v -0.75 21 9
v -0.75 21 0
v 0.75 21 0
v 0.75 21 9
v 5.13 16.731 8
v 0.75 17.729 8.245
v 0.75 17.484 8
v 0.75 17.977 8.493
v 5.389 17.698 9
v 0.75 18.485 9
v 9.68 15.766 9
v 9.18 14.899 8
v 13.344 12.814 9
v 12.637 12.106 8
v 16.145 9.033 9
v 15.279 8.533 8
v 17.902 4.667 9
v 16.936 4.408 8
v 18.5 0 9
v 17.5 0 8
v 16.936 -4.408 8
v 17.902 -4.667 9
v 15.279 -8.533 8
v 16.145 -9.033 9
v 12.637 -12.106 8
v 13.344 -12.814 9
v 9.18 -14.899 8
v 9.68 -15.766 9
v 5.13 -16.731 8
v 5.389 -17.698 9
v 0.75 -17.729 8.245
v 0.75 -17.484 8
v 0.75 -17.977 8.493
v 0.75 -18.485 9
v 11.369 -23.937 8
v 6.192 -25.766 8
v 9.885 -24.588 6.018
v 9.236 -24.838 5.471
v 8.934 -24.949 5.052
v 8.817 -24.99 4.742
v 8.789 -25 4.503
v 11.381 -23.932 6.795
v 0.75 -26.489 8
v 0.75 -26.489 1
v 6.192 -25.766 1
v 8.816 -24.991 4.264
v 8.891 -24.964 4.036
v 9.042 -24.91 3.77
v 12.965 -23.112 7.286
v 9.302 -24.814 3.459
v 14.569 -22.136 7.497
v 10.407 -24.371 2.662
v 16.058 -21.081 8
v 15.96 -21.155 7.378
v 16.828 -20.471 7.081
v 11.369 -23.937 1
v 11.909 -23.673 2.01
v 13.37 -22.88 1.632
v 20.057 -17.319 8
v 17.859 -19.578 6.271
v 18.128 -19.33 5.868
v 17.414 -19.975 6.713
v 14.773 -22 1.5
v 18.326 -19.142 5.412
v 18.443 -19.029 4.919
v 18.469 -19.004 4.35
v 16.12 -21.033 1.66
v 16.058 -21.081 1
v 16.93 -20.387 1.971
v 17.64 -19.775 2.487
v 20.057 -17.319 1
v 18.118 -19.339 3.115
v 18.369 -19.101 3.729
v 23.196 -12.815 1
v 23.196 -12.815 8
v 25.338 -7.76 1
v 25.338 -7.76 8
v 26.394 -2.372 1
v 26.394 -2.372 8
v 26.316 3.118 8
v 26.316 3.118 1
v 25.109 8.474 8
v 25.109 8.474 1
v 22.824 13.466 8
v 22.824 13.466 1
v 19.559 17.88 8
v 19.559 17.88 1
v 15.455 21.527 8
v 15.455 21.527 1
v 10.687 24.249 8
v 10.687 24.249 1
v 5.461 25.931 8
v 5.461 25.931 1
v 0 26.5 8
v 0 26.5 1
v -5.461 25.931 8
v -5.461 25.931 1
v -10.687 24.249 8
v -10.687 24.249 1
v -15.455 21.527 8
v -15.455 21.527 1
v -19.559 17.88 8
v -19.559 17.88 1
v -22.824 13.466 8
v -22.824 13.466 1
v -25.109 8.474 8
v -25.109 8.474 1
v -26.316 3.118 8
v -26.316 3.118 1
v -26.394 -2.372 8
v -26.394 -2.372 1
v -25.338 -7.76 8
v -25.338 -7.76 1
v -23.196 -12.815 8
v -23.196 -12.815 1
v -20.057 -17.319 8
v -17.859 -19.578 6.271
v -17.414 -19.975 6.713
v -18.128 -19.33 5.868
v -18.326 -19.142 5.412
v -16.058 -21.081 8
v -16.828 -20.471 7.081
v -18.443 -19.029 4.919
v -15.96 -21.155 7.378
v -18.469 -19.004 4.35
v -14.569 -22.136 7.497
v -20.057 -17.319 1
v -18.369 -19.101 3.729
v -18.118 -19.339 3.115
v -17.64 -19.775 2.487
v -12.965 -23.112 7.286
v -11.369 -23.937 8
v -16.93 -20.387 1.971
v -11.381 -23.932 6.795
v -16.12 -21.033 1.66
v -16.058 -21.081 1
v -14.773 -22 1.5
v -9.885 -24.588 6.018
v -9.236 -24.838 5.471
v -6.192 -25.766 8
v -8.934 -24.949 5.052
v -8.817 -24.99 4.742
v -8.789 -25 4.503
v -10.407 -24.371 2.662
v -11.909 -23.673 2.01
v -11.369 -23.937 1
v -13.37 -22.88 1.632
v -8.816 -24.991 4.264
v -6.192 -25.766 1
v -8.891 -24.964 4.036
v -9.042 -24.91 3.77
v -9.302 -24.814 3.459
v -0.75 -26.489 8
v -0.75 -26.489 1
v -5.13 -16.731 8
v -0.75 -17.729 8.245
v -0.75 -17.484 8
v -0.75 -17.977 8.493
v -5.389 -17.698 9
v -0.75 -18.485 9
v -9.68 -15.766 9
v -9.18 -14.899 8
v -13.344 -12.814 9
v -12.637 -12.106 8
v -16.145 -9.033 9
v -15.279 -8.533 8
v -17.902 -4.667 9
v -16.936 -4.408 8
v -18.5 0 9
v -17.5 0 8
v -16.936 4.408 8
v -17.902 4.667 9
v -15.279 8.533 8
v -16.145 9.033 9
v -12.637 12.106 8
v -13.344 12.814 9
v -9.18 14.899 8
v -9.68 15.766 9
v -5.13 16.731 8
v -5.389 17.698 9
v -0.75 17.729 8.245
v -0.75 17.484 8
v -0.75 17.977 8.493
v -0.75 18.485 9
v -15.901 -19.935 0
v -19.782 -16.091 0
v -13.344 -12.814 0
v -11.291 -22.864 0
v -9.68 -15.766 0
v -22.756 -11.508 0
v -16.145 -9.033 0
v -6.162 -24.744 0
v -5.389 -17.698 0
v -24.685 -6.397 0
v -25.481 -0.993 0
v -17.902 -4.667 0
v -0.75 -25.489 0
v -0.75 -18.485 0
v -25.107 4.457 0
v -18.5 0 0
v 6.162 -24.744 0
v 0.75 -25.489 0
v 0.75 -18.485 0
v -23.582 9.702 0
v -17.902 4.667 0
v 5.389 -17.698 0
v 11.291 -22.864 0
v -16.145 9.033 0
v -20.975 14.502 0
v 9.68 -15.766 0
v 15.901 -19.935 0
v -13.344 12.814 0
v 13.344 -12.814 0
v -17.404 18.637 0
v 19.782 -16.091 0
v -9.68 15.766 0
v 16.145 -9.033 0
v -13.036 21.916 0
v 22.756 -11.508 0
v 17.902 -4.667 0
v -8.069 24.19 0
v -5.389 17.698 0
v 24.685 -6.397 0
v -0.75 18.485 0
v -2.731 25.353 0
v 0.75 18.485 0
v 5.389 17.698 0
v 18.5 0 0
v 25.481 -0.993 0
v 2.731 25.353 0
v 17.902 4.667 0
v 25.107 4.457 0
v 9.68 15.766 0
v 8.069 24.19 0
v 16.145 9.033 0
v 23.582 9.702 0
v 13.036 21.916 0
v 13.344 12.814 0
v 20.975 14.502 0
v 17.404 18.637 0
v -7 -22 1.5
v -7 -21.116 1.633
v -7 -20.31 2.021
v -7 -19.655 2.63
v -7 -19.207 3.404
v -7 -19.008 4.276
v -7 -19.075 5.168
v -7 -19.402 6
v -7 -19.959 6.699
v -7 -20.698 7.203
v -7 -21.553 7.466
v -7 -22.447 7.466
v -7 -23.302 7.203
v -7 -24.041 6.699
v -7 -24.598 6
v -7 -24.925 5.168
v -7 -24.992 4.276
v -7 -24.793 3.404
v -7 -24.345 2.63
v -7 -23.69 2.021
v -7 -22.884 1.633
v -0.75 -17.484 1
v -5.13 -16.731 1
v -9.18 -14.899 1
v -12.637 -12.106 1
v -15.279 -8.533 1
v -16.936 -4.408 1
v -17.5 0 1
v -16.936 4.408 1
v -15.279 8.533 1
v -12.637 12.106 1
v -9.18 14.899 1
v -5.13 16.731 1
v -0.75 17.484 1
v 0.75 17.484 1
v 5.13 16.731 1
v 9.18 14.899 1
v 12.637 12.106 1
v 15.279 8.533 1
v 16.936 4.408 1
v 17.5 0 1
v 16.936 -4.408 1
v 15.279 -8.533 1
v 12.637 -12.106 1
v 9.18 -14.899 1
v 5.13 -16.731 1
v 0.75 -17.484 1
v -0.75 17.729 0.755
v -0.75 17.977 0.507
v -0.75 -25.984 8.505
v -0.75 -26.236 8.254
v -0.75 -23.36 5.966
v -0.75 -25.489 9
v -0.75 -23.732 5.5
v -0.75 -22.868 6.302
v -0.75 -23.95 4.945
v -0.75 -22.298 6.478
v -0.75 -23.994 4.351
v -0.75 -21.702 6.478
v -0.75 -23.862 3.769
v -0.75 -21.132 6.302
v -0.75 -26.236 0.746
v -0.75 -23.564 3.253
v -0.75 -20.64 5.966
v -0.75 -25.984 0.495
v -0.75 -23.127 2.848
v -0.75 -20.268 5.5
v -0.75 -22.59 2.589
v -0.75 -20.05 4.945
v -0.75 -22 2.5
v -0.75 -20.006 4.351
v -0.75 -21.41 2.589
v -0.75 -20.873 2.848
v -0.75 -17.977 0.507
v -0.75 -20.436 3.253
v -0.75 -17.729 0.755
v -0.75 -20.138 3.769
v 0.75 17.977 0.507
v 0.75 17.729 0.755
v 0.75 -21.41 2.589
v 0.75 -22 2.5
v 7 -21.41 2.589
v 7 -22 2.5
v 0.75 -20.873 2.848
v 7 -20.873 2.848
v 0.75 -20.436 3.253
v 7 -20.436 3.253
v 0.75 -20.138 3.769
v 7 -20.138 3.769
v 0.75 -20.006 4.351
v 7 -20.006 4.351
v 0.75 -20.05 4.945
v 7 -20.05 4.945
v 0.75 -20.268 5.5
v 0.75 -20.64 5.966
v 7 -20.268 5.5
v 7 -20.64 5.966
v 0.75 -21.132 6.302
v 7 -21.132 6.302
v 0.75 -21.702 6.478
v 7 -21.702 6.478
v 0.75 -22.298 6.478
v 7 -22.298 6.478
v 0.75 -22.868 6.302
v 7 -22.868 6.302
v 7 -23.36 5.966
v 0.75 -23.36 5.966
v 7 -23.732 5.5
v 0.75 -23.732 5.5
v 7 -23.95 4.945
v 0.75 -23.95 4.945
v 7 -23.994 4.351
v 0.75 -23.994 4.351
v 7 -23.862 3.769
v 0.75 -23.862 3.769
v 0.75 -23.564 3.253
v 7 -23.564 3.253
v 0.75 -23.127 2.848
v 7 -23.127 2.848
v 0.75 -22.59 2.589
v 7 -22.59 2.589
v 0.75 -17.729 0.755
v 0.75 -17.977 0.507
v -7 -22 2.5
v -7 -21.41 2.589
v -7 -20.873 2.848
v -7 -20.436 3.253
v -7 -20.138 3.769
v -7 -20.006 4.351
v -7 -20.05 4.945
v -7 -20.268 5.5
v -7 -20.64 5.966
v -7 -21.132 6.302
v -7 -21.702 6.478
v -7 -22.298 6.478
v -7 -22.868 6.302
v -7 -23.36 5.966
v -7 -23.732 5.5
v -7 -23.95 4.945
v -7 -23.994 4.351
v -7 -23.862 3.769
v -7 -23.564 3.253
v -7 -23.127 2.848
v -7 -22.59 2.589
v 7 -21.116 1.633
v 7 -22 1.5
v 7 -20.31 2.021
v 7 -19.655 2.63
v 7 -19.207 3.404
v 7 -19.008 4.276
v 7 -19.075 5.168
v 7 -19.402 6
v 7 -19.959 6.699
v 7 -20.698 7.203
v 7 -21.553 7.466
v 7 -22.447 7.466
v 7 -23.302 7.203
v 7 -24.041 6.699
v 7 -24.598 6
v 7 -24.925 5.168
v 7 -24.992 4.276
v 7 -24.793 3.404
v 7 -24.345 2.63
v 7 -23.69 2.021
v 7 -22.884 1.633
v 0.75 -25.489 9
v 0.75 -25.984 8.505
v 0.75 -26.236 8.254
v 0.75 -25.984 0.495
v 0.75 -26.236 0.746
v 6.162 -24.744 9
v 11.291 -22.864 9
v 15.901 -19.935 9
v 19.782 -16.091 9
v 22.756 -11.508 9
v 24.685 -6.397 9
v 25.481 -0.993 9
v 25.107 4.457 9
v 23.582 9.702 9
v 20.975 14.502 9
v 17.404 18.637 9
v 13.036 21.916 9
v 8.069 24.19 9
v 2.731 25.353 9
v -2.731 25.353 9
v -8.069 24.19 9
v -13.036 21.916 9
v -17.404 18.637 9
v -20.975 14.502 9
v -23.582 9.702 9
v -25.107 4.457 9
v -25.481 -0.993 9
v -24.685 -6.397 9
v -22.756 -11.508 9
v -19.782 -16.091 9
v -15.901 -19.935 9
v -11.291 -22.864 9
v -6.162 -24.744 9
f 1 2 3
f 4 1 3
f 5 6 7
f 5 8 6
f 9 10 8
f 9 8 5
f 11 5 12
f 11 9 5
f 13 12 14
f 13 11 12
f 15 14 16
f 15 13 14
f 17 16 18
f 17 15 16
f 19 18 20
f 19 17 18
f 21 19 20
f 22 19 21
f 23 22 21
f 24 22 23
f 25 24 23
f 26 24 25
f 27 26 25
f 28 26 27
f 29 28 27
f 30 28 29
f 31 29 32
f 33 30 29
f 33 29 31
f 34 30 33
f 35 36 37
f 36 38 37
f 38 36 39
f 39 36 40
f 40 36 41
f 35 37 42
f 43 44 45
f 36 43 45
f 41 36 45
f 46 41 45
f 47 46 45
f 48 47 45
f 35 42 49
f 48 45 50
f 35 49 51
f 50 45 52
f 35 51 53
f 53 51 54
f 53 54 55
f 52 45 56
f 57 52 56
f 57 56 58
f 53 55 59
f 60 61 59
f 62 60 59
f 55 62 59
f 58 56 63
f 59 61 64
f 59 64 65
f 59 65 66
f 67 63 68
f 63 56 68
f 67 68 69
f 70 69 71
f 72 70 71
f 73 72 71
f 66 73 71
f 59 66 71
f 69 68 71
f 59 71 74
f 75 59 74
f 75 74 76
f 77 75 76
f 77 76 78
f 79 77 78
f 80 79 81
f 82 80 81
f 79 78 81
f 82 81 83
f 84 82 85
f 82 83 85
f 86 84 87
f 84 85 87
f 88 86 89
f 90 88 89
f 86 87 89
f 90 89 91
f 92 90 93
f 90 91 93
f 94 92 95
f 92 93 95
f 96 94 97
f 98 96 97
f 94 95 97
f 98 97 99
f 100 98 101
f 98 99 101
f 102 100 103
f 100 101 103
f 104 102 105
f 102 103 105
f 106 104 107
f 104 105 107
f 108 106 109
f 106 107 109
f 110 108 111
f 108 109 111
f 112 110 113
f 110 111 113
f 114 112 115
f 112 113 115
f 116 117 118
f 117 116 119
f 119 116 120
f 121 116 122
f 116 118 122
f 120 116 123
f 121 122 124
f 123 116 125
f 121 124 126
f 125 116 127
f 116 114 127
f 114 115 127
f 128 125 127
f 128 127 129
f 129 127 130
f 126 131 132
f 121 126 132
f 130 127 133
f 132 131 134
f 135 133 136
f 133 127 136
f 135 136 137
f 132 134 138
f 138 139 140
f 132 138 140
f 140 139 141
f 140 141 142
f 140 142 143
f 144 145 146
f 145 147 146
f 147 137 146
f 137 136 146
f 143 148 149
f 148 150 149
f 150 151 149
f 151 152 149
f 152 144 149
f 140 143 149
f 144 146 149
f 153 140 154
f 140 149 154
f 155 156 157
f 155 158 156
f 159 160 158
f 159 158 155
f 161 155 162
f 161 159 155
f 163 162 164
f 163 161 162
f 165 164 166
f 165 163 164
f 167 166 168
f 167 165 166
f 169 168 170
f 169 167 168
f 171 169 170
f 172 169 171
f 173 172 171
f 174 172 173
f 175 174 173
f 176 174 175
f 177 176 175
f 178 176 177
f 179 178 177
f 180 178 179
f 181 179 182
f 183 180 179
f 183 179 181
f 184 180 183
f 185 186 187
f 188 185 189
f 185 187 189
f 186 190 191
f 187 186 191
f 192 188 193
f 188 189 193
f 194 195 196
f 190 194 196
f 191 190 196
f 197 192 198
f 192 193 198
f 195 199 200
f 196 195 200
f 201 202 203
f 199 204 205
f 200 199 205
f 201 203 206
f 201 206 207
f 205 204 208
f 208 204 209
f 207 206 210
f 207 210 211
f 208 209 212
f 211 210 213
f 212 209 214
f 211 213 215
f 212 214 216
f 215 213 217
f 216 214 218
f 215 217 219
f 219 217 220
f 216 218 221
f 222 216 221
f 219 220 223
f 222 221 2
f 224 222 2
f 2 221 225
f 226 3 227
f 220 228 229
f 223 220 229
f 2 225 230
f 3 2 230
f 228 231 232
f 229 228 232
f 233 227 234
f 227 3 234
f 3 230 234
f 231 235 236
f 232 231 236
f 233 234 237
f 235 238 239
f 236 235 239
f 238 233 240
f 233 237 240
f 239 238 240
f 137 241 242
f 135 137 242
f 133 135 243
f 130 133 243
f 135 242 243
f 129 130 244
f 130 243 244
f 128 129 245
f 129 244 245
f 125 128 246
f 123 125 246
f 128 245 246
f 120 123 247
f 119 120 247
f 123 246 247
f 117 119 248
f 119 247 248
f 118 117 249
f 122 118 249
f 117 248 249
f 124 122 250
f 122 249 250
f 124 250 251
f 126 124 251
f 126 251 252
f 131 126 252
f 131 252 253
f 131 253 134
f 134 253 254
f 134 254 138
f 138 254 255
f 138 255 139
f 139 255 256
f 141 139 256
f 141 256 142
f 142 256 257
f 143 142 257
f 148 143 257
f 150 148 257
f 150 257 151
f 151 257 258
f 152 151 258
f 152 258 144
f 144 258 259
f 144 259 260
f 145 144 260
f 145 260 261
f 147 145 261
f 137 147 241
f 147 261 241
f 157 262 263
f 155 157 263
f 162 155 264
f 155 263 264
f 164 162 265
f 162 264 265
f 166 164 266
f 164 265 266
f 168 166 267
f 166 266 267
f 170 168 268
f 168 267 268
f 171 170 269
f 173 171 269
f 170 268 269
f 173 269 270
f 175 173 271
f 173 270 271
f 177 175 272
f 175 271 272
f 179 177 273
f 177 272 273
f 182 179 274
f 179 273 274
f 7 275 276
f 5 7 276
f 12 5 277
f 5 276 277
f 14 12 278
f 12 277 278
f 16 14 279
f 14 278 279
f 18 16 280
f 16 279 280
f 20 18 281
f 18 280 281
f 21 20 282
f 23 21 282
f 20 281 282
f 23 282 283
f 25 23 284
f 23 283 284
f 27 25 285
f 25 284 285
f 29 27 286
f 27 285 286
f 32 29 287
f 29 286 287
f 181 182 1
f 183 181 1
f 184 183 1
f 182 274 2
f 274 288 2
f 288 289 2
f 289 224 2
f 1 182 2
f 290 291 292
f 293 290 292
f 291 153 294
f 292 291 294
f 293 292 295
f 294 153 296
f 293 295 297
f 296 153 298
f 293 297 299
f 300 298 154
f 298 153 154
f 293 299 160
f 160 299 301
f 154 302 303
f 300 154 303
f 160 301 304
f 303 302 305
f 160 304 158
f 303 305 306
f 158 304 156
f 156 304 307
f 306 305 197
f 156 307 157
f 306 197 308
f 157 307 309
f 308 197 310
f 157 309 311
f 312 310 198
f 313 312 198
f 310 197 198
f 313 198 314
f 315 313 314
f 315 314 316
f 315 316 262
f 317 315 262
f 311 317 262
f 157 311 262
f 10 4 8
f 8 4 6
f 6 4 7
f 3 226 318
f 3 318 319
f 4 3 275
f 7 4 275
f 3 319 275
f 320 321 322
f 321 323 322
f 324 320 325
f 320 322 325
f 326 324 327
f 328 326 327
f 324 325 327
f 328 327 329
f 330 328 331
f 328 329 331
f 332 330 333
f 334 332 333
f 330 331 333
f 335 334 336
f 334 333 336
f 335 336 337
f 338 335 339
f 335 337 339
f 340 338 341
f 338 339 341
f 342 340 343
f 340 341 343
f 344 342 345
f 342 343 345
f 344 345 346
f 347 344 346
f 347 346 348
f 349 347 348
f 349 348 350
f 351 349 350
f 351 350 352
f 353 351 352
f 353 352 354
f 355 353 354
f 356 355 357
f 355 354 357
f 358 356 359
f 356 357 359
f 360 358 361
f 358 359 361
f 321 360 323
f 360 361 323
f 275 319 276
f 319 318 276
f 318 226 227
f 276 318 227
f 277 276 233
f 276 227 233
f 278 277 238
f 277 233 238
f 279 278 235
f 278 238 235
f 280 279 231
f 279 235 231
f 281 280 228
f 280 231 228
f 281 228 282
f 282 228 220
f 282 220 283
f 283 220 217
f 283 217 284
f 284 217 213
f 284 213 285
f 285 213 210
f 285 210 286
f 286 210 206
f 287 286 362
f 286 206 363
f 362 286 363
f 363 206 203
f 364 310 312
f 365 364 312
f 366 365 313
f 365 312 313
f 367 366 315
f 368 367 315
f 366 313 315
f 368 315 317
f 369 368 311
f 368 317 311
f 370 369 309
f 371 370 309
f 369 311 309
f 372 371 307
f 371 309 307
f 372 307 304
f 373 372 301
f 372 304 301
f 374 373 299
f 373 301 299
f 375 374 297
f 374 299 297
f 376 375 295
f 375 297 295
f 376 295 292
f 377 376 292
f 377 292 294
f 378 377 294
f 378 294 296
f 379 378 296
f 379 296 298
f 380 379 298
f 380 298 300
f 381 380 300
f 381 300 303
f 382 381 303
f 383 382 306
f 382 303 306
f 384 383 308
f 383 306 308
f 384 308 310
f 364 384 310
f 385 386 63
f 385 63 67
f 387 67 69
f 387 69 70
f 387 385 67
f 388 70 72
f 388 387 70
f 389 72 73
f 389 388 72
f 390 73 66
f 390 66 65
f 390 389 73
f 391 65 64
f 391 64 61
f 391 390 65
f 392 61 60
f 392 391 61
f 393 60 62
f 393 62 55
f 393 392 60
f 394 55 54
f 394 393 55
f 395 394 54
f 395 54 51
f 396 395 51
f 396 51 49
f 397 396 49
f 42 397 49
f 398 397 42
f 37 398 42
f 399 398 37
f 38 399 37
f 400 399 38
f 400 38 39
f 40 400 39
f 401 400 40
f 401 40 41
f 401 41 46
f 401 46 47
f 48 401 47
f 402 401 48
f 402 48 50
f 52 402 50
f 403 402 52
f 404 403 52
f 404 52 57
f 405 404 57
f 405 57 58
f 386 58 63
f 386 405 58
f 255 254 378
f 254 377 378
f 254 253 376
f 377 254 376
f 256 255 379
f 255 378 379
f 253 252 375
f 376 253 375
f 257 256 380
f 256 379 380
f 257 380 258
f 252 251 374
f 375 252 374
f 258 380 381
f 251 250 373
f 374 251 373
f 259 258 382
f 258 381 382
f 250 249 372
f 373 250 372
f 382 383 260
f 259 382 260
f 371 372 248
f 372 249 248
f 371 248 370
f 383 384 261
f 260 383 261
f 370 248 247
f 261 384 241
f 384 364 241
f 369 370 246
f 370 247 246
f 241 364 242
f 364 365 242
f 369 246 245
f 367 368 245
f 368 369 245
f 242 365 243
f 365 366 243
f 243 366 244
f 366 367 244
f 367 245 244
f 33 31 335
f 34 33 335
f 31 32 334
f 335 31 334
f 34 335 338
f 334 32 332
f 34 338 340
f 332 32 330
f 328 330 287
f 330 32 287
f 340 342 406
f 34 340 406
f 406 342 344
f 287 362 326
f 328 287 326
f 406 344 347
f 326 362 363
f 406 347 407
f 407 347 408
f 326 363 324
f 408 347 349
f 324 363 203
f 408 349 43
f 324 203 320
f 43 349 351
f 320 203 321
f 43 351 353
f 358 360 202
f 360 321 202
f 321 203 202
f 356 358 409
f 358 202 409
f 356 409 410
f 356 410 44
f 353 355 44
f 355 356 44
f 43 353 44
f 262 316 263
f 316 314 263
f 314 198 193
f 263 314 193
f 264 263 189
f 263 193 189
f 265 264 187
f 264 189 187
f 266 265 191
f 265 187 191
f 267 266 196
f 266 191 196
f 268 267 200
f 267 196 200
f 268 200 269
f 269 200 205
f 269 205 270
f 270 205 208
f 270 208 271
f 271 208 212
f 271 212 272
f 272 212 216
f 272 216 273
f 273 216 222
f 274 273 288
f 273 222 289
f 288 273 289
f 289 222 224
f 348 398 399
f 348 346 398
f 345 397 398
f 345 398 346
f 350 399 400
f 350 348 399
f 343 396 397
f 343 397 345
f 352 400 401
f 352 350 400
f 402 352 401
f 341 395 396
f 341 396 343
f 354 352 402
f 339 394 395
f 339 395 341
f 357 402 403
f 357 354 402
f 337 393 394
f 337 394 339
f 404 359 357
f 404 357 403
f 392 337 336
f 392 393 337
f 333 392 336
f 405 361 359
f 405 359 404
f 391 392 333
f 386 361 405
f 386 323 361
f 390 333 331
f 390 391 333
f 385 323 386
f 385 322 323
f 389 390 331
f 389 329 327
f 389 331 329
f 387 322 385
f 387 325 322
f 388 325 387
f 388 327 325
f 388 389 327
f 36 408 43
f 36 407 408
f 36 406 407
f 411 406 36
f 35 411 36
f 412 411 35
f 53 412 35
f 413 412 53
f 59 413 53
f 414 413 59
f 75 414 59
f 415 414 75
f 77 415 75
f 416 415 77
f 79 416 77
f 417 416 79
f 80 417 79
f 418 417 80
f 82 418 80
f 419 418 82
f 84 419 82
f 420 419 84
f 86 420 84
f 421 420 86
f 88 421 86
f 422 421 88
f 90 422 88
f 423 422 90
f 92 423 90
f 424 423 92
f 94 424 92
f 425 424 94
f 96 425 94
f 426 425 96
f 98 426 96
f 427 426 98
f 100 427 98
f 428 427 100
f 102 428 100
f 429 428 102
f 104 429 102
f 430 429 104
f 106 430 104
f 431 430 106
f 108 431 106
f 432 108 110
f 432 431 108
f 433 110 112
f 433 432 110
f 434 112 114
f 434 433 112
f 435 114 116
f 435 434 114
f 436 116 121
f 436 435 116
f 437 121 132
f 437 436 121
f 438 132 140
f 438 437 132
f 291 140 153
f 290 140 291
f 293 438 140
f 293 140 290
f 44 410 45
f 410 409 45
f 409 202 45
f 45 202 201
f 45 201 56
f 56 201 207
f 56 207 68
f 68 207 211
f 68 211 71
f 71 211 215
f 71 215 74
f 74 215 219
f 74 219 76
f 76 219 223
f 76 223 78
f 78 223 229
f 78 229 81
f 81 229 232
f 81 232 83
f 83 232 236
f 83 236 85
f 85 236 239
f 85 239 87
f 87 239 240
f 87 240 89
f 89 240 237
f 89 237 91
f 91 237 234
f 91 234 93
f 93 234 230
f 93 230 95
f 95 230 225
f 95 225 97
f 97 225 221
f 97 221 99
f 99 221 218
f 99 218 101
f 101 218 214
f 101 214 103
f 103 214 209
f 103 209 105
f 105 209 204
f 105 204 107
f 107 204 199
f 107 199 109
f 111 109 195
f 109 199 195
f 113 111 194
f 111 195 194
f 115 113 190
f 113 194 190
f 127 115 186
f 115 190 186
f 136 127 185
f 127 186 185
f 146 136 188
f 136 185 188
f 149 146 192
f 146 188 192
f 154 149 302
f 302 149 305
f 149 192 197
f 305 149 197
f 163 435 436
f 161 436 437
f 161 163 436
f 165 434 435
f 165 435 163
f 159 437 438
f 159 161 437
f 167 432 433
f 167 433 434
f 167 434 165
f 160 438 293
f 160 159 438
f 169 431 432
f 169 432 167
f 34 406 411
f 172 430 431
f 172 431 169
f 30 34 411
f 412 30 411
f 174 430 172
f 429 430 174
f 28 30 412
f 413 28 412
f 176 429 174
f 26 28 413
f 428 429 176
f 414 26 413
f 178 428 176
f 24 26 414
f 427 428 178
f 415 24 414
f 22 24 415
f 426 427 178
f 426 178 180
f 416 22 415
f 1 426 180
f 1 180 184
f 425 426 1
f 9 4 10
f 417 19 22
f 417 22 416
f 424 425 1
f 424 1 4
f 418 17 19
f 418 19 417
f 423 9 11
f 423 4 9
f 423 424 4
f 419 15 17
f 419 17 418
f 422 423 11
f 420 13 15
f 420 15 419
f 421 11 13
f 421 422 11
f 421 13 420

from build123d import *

# Parameters (mm, degrees)
BOSS_EXTRUDE1_DEPTH = 9
CHAMFER1_SIZE       = 1
SKETCH2_R           = 2
CUT_EXTRUDE1_DEPTH  = 7
SKETCH3_R           = 3
CUT_EXTRUDE2_DEPTH  = 20.5


with BuildPart() as part:
    # Sketch1 → Boss-Extrude1 (new body)
    with BuildSketch(Plane.XY):
        with BuildLine():
            Line((-0.75, 21), (0.75, 21))
            Line((0.75, 21), (0.75, 17.483921185))
            ThreePointArc((0.75, 17.483921185), (17.5, 0), (0.75, -17.483921185))
            Line((0.75, -17.483921185), (0.75, -26.489384666))
            ThreePointArc((0.75, -26.489384666), (0, 26.5), (-0.75, -26.489384666))
            Line((-0.75, -26.489384666), (-0.75, -17.483921185))
            ThreePointArc((-0.75, -17.483921185), (-17.5, 0), (-0.75, 17.483921185))
            Line((-0.75, 17.483921185), (-0.75, 21))
        make_face()
    extrude(amount=BOSS_EXTRUDE1_DEPTH)

    # Chamfer1
    chamfer1_edges = [part.edges().sort_by_distance(p)[0] for p in [
        (0, 26.5, 0),
        (17.5, 0, 0),
        (0, 26.5, 9),
        (-17.5, 0, 9),
        (17.5, 0, 9),
        (-17.5, 0, 0),
    ]]
    chamfer(chamfer1_edges, length=CHAMFER1_SIZE)

    # Sketch2 → Cut-Extrude1 (cut, symmetric)
    with BuildSketch(Plane(origin=(0, 0, 0), x_dir=(0, 0, -1), z_dir=(1, 0, 0))):
        with Locations((-4.5, -22)):
            Circle(SKETCH2_R)
    extrude(amount=CUT_EXTRUDE1_DEPTH, both=True, mode=Mode.SUBTRACT)

    # Sketch3 → Cut-Extrude2 (cut, through all)
    with BuildSketch(Plane(origin=(7, 0, 0), x_dir=(0, 0, -1), z_dir=(1, 0, 0))):
        with Locations((-4.5, -22)):
            Circle(SKETCH3_R)
    cut_extrude2 = extrude(amount=CUT_EXTRUDE2_DEPTH, mode=Mode.SUBTRACT)

    # Mirror1: Cut-Extrude2 across plane
    add(cut_extrude2.mirror(Plane(origin=(0, 0, 0), x_dir=(0, 0, 1), z_dir=(1, 0, 0))), mode=Mode.SUBTRACT)


solid = part.part
